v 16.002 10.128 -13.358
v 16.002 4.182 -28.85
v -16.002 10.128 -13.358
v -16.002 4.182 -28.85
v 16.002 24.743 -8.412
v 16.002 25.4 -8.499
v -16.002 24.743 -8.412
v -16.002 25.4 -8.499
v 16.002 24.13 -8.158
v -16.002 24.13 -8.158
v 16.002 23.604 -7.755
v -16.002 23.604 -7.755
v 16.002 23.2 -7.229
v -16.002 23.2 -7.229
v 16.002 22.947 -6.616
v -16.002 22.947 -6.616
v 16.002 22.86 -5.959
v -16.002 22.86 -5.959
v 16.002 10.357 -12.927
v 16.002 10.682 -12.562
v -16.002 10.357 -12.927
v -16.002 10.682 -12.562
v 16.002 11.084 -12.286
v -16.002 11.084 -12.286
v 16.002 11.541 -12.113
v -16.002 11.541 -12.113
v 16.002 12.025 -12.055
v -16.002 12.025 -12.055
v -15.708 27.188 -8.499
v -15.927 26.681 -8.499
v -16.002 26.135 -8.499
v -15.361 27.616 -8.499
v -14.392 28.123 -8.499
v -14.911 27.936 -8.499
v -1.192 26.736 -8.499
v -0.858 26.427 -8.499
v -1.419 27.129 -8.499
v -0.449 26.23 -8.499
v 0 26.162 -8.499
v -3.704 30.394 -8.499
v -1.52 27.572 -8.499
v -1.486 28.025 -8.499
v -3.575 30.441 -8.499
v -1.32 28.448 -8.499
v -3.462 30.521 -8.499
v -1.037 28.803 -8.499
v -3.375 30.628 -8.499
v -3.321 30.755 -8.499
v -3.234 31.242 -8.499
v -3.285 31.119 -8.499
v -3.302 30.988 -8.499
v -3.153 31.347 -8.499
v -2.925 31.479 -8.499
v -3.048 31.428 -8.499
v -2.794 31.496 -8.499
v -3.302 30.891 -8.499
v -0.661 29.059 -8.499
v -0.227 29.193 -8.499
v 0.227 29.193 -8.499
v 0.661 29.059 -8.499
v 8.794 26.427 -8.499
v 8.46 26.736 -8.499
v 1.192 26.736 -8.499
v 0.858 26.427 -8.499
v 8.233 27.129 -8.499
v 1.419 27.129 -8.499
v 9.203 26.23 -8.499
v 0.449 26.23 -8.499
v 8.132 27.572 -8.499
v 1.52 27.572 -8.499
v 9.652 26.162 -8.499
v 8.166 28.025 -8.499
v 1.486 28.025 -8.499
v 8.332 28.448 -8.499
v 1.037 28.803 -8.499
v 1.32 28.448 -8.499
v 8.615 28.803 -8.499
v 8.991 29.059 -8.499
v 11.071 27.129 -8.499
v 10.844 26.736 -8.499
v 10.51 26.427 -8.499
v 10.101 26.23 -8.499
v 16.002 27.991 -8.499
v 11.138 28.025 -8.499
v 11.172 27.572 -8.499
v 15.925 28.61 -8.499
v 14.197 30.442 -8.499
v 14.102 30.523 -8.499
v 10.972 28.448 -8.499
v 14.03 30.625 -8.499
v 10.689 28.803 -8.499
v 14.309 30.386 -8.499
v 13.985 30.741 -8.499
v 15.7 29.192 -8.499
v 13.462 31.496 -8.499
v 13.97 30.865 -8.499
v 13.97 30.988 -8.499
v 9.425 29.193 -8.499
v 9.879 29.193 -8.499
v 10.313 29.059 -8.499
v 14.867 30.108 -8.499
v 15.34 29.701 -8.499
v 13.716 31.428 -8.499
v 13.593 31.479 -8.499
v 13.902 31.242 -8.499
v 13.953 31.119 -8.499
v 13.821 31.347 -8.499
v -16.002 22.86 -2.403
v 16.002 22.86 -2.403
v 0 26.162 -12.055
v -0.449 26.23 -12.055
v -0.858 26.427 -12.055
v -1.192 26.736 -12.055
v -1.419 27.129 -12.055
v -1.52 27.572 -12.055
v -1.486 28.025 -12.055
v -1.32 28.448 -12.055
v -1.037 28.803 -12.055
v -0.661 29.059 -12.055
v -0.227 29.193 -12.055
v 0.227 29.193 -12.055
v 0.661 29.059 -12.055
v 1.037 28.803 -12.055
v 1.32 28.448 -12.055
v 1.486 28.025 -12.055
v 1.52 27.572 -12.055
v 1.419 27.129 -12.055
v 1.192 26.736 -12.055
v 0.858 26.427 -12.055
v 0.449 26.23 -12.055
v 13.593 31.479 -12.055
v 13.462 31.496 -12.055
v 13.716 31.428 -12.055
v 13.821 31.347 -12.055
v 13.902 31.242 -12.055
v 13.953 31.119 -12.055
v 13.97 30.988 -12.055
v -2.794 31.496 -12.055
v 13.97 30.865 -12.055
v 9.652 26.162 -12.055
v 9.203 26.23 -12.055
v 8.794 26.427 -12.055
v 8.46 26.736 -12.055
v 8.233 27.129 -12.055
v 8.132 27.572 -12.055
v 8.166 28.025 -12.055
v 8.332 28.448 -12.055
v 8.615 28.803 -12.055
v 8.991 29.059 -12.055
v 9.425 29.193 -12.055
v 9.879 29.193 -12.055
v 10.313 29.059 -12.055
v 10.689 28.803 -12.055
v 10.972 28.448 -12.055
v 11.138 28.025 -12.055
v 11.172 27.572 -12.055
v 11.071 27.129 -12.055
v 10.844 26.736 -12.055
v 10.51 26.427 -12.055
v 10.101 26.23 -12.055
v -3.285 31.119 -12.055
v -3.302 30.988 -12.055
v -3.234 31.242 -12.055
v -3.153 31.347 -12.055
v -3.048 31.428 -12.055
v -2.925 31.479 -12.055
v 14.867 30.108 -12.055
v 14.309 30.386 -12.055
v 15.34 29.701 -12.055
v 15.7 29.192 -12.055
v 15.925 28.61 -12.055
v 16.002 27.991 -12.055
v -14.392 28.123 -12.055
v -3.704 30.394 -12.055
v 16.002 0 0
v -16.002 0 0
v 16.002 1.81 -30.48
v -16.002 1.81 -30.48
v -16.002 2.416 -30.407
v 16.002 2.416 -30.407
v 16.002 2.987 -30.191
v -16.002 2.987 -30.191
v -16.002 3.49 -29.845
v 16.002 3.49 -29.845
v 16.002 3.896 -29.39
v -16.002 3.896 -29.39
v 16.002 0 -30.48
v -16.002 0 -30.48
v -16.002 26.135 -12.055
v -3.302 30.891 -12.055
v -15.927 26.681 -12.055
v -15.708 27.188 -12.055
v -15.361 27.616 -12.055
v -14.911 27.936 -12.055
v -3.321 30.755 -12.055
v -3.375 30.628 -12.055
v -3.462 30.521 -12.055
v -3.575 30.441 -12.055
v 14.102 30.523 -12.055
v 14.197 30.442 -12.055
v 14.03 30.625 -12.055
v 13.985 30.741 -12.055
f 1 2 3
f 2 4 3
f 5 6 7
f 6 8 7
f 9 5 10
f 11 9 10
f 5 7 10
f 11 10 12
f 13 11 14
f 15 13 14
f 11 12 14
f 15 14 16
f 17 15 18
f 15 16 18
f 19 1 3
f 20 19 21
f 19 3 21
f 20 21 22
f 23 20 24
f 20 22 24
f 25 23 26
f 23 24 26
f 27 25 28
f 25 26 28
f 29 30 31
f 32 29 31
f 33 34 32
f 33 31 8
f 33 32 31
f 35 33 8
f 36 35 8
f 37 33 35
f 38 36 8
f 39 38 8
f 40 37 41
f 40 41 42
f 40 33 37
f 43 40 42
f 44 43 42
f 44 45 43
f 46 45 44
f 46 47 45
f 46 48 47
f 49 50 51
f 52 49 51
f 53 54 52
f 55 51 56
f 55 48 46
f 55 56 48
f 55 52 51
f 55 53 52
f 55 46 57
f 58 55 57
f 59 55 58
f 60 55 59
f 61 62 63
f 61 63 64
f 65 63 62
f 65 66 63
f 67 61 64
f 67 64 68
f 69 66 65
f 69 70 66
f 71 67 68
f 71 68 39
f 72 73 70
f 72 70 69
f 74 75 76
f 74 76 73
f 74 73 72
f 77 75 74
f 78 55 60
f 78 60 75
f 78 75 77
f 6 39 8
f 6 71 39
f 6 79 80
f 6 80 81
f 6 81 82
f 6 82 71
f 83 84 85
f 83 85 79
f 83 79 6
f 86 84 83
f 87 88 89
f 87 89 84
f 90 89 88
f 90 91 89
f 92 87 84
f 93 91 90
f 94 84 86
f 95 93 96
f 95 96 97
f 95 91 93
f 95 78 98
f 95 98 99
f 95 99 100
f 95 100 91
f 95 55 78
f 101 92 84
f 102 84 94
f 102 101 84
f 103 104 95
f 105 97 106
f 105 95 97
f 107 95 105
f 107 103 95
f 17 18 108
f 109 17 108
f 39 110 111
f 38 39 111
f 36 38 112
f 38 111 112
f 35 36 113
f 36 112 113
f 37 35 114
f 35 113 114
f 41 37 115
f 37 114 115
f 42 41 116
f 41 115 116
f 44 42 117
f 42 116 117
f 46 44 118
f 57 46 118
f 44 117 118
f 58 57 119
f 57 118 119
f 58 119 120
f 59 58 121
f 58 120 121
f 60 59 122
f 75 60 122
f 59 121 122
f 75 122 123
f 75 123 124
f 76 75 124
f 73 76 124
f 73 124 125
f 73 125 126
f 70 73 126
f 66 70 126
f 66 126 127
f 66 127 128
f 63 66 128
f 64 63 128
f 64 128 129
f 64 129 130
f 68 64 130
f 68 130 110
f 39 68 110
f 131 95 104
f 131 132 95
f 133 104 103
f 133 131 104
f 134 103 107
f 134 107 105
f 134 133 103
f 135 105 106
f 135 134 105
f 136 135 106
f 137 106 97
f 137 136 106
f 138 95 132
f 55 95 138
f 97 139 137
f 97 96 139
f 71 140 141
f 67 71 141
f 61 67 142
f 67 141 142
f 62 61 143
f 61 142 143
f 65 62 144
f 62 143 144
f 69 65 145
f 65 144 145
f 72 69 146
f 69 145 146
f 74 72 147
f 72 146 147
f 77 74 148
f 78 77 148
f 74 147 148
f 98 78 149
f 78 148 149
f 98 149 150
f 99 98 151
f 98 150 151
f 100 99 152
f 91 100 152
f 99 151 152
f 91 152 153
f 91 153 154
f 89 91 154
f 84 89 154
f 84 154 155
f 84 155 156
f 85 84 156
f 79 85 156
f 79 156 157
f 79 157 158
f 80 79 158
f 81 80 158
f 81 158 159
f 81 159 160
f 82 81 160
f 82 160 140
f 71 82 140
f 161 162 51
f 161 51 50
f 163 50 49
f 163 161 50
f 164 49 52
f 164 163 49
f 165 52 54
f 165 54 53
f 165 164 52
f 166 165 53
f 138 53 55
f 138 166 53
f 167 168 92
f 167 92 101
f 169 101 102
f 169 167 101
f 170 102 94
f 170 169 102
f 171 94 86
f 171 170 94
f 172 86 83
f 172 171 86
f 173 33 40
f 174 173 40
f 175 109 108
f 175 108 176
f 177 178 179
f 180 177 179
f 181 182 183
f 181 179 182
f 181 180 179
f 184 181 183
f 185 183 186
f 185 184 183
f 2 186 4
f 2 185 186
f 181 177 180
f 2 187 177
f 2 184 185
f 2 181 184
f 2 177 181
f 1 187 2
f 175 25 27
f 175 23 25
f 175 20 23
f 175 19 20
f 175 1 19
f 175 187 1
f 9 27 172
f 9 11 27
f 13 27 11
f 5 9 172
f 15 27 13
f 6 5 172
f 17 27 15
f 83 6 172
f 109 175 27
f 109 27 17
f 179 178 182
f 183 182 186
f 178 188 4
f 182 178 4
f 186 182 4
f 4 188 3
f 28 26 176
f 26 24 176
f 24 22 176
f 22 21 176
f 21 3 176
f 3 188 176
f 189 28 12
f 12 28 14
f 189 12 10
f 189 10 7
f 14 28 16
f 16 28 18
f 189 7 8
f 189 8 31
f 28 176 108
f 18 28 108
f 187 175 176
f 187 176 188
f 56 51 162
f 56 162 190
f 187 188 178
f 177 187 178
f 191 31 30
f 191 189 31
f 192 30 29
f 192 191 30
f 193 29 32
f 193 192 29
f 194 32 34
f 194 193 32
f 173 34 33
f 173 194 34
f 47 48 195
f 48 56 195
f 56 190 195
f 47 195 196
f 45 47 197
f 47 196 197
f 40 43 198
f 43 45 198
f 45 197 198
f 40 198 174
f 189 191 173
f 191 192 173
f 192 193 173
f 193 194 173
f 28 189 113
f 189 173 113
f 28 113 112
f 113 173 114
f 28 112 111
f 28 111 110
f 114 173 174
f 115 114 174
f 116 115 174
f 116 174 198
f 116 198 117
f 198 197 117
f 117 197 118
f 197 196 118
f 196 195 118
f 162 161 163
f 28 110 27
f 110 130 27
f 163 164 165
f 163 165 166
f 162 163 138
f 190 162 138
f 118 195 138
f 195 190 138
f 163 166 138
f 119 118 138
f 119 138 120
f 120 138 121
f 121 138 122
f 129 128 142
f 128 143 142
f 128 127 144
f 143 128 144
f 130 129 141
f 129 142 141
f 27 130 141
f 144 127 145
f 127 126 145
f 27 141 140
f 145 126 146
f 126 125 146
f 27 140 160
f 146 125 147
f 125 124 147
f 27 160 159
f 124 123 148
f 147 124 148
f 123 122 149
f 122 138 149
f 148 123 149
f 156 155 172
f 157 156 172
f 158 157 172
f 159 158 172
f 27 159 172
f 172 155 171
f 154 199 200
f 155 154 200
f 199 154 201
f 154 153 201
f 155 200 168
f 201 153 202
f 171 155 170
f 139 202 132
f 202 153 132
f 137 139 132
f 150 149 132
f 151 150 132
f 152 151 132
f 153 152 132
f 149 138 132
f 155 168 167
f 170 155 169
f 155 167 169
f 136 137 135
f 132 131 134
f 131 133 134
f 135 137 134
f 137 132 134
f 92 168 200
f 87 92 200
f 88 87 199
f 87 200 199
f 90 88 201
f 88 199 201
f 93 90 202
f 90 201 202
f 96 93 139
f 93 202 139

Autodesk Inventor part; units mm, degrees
ref_plane "YZ Plane" through (0, 0, 0) normal (1, 0, 0) x (0, 1, 0)
ref_plane "XZ Plane" through (0, 0, 0) normal (0, 1, 0) x (-1, 0, 0)
ref_plane "XY Plane" through (0, 0, 0) normal (0, 0, 1) x (1, 0, 0)
sketch "Sketch2" plane through (0, 0, 0) normal (1, 0, 0) x (0, 1, 0)
  line L0 (0, 0) -> (0, -30.48)
  line L1 (0, -30.48) -> (3.556, -30.48)
  line L2 (3.556, -30.48) -> (10.6288, -12.0547)
  line L3 (10.6288, -12.0547) -> (30.48, -12.0547)
  line L4 (30.48, -12.0547) -> (30.48, -8.4987)
  line L5 (30.48, -8.4987) -> (22.86, -8.4987)
  line L6 (22.86, -8.4987) -> (22.86, -2.4027)
  line L7 (22.86, -2.4027) -> (0, 0)
  dimension "d0" = 30.48
  dimension "d1" = 21
  dimension "d2" = 84
  dimension "d3" = 30.48
  dimension "d4" = 22.86
  dimension "d5" = 3.556
  dimension "d6" = 9.652
  dimension "d7" = 3.556
extrude "Extrusion1" add sketch "Sketch2" along normal mid plane 32.004
sketch "Sketch3" plane through (-16.002, 22.86, -8.4987) normal (0, 0, 1) x (1, 0, 0)
  line L0 (0, 7.62) -> (0, -12.2312) projected
  line L1 (0, 7.62) -> (12.7, 7.62)
  line L2 (0, 7.62) -> (32.004, 7.62) projected
  line L3 (0, 4.9205) -> (0, 7.62)
  line L4 (0, 4.9205) -> (12.7, 7.62)
  point P0 (16.002, -22.86)
  dimension "d10" = 12
  dimension "d11" = 12.7
extrude "Extrusion2" cut sketch "Sketch3" against normal blind 32.004
sketch "Sketch4" plane through (-16.002, 22.86, -8.4987) normal (0, 0, 1) x (1, 0, 0)
  line L0 (0, 4.9205) -> (12.7, 7.62) projected
  line L1 (12.7, 7.62) -> (29.972, 7.62)
  line L2 (29.972, 7.62) -> (29.972, 8.636)
  line L3 (29.972, 8.636) -> (12.7, 8.636)
  line L4 (12.7, 8.636) -> (12.7, 7.62)
  line L5 (32.004, 7.62) -> (32.004, 0) projected
  point P0 (16.002, -22.86)
  dimension "d15" = 1.016
  dimension "d18" = 17.272
extrude "Extrusion3" add sketch "Sketch4" against normal up to surface (3.556 mm away)
fillet "Fillet1" radius 2.54 1 edges at (0, 22.86, -8.4987)
fillet "Fillet2" radius 2.032 1 edges at (-16.002, 27.7805, -10.2767)
fillet "Fillet3" radius 2.54 1 edges at (16.002, 30.48, -10.2767)
fillet "Fillet4" radius 2.032 1 edges at (0, 10.6288, -12.0547)
fillet "Fillet4" radius 2.54 1 edges at (0, 3.556, -30.48)
fillet "Fillet4" radius 0.508 4 edges at (13.97, 30.48, -10.2767) (13.97, 31.496, -10.2767) (-3.302, 31.496, -10.2767) (-3.302, 30.48, -10.2767)
sketch "Sketch5" plane through (-16.002, 22.86, -8.4987) normal (0, 0, 1) x (1, 0, 0)
  line L0 (0, 0) -> (32.004, 0) projected
  line L1 (32.004, 7.62) -> (32.004, 0) projected
  point P0 (16.002, -22.86)
  point P1 (16.002, 4.826)
  point P2 (25.654, 4.826)
  dimension "d28" = 9.652
  dimension "d29" = 4.826
  dimension "d30" = 6.35
hole "Hole2" at (0, 27.686, -8.4987) at (9.652, 27.686, -8.4987) direction (0, 0, -1) diameter 3.048 end through all
